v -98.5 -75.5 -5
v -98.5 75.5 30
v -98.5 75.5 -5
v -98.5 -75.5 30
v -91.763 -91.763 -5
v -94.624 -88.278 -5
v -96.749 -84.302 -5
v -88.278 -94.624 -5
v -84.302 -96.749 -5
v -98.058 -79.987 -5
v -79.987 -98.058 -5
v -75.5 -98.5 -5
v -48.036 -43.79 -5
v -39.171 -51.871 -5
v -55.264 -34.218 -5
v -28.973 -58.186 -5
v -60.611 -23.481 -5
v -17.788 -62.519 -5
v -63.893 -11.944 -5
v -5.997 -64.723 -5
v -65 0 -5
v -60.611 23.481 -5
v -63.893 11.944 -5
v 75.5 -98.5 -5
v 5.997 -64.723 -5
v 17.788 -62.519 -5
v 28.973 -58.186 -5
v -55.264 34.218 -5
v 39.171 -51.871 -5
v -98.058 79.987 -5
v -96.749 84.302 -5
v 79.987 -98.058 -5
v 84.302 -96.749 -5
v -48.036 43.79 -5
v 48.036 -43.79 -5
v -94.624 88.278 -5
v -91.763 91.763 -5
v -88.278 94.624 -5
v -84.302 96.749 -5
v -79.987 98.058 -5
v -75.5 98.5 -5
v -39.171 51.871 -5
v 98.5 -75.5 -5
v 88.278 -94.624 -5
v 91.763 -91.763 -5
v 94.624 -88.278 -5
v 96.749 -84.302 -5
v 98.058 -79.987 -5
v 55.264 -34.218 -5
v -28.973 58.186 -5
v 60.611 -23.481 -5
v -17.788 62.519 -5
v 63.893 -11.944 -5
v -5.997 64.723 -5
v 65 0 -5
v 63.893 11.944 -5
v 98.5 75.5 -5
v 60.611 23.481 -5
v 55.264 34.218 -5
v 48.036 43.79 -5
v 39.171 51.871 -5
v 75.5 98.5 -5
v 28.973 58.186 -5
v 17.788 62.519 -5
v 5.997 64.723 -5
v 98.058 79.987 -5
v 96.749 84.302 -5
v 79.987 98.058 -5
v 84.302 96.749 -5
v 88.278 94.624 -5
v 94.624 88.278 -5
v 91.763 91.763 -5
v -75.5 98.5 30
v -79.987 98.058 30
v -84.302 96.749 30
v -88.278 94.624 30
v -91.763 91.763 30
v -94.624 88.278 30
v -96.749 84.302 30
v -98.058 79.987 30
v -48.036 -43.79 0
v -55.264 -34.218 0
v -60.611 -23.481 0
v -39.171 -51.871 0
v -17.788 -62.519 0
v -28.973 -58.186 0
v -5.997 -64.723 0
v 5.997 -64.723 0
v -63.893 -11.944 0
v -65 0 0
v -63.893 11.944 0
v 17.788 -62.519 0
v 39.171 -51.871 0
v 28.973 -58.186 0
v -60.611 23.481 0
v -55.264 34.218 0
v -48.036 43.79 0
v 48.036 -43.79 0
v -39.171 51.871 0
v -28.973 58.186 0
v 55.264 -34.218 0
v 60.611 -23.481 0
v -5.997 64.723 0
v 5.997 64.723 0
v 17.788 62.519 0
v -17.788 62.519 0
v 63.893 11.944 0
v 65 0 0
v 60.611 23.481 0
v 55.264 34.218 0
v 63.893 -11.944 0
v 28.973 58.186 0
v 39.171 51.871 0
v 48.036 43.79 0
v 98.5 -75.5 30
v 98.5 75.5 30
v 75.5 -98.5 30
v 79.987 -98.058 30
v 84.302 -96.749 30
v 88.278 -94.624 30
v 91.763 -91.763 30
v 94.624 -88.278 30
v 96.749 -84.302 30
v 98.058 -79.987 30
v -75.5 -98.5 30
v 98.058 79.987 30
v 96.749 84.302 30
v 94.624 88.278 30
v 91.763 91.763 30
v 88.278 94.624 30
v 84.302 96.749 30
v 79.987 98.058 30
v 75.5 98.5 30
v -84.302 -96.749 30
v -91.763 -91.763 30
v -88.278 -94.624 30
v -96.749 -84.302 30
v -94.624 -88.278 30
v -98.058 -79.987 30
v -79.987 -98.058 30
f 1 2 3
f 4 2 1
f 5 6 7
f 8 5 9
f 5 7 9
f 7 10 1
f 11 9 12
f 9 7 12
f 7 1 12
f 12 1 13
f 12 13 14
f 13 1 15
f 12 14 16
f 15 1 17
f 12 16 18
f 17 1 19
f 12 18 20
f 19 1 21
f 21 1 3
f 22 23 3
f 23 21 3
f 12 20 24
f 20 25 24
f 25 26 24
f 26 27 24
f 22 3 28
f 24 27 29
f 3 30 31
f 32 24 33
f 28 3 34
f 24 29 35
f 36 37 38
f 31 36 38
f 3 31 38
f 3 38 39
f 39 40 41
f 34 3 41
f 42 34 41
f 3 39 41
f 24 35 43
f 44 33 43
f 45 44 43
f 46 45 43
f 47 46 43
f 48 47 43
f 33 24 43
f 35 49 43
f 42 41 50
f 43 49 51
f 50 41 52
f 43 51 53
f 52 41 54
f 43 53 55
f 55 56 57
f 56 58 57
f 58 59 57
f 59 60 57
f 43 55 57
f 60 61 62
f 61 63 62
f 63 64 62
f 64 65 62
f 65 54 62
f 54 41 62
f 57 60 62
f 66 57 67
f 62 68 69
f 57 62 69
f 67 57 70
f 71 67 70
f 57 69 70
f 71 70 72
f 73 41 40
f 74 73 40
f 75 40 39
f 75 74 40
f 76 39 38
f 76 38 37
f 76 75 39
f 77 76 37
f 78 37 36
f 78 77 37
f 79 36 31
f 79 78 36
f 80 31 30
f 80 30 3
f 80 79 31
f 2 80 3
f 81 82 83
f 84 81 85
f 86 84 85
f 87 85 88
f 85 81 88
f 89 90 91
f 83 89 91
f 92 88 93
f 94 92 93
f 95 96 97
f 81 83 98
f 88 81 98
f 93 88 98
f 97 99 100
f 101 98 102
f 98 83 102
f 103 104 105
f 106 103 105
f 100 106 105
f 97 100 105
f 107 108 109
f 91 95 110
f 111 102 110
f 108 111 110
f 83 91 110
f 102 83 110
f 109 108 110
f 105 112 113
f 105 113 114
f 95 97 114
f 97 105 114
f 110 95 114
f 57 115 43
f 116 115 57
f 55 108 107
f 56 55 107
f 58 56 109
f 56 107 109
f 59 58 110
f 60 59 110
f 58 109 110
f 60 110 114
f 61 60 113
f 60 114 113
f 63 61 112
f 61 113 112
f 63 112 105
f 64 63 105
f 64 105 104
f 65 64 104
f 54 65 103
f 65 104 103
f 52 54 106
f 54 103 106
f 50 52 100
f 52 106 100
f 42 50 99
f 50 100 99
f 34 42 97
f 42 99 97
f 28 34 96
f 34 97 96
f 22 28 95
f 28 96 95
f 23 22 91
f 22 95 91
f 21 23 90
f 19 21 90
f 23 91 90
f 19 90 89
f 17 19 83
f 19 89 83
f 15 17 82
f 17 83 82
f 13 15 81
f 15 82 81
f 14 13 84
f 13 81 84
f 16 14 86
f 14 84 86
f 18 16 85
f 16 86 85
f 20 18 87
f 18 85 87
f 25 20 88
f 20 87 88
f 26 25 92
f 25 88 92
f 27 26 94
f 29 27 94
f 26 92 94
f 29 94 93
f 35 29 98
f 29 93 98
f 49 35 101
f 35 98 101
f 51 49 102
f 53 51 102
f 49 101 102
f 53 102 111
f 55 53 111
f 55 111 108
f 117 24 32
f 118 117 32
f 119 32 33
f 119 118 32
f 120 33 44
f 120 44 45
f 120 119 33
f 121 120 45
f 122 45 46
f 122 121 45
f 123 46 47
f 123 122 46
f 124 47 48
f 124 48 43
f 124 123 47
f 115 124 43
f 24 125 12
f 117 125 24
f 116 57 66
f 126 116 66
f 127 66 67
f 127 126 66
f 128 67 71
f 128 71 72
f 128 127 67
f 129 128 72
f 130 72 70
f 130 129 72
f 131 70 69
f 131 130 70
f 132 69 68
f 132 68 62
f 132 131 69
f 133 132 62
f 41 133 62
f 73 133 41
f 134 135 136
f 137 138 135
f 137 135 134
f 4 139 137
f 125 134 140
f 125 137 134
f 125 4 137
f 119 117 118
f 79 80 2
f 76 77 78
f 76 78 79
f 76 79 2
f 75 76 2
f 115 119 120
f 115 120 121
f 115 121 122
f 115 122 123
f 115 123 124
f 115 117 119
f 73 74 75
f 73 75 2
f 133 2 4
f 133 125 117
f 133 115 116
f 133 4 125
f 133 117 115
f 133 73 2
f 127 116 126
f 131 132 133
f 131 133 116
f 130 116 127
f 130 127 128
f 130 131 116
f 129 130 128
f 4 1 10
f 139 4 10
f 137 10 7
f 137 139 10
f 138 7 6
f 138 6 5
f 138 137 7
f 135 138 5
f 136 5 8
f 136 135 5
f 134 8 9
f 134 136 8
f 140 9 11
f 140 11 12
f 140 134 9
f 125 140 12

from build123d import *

# Parameters (mm, degrees)
F1_DEPTH = 30
F2_R     = 75
F2_R_2   = 65
F3_DEPTH = 5


with BuildPart() as f1:
    # F0 (on Top) → F1 (new body)
    with BuildSketch(Plane.XY):
        with BuildLine():
            ThreePointArc((98.5, 75.5), (91.763456, 91.763456), (75.5, 98.5))
            Line((75.5, 98.5), (-75.5, 98.5))
            ThreePointArc((-75.5, 98.5), (-91.763456, 91.763456), (-98.5, 75.5))
            Line((-98.5, 75.5), (-98.5, -75.5))
            ThreePointArc((-98.5, -75.5), (-91.763456, -91.763456), (-75.5, -98.5))
            Line((-75.5, -98.5), (75.5, -98.5))
            ThreePointArc((75.5, -98.5), (91.763456, -91.763456), (98.5, -75.5))
            Line((98.5, -75.5), (98.5, 75.5))
        make_face()
    extrude(amount=F1_DEPTH)

    # F2 (on face) → F3 (join)
    with BuildSketch(Plane.XY):
        with BuildLine():
            Line((98.5, -75.5), (98.5, 75.5))
            ThreePointArc((98.5, 75.5), (91.763456, 91.763456), (75.5, 98.5))
            Line((75.5, 98.5), (-75.5, 98.5))
            ThreePointArc((-75.5, 98.5), (-91.763456, 91.763456), (-98.5, 75.5))
            Line((-98.5, 75.5), (-98.5, -75.5))
            ThreePointArc((-98.5, -75.5), (-91.763456, -91.763456), (-75.5, -98.5))
            Line((-75.5, -98.5), (75.5, -98.5))
            ThreePointArc((75.5, -98.5), (91.763456, -91.763456), (98.5, -75.5))
        make_face()
        Circle(F2_R, mode=Mode.SUBTRACT)
        Circle(F2_R)
        Circle(F2_R_2, mode=Mode.SUBTRACT)
    extrude(amount=-F3_DEPTH)


solid = f1.part
